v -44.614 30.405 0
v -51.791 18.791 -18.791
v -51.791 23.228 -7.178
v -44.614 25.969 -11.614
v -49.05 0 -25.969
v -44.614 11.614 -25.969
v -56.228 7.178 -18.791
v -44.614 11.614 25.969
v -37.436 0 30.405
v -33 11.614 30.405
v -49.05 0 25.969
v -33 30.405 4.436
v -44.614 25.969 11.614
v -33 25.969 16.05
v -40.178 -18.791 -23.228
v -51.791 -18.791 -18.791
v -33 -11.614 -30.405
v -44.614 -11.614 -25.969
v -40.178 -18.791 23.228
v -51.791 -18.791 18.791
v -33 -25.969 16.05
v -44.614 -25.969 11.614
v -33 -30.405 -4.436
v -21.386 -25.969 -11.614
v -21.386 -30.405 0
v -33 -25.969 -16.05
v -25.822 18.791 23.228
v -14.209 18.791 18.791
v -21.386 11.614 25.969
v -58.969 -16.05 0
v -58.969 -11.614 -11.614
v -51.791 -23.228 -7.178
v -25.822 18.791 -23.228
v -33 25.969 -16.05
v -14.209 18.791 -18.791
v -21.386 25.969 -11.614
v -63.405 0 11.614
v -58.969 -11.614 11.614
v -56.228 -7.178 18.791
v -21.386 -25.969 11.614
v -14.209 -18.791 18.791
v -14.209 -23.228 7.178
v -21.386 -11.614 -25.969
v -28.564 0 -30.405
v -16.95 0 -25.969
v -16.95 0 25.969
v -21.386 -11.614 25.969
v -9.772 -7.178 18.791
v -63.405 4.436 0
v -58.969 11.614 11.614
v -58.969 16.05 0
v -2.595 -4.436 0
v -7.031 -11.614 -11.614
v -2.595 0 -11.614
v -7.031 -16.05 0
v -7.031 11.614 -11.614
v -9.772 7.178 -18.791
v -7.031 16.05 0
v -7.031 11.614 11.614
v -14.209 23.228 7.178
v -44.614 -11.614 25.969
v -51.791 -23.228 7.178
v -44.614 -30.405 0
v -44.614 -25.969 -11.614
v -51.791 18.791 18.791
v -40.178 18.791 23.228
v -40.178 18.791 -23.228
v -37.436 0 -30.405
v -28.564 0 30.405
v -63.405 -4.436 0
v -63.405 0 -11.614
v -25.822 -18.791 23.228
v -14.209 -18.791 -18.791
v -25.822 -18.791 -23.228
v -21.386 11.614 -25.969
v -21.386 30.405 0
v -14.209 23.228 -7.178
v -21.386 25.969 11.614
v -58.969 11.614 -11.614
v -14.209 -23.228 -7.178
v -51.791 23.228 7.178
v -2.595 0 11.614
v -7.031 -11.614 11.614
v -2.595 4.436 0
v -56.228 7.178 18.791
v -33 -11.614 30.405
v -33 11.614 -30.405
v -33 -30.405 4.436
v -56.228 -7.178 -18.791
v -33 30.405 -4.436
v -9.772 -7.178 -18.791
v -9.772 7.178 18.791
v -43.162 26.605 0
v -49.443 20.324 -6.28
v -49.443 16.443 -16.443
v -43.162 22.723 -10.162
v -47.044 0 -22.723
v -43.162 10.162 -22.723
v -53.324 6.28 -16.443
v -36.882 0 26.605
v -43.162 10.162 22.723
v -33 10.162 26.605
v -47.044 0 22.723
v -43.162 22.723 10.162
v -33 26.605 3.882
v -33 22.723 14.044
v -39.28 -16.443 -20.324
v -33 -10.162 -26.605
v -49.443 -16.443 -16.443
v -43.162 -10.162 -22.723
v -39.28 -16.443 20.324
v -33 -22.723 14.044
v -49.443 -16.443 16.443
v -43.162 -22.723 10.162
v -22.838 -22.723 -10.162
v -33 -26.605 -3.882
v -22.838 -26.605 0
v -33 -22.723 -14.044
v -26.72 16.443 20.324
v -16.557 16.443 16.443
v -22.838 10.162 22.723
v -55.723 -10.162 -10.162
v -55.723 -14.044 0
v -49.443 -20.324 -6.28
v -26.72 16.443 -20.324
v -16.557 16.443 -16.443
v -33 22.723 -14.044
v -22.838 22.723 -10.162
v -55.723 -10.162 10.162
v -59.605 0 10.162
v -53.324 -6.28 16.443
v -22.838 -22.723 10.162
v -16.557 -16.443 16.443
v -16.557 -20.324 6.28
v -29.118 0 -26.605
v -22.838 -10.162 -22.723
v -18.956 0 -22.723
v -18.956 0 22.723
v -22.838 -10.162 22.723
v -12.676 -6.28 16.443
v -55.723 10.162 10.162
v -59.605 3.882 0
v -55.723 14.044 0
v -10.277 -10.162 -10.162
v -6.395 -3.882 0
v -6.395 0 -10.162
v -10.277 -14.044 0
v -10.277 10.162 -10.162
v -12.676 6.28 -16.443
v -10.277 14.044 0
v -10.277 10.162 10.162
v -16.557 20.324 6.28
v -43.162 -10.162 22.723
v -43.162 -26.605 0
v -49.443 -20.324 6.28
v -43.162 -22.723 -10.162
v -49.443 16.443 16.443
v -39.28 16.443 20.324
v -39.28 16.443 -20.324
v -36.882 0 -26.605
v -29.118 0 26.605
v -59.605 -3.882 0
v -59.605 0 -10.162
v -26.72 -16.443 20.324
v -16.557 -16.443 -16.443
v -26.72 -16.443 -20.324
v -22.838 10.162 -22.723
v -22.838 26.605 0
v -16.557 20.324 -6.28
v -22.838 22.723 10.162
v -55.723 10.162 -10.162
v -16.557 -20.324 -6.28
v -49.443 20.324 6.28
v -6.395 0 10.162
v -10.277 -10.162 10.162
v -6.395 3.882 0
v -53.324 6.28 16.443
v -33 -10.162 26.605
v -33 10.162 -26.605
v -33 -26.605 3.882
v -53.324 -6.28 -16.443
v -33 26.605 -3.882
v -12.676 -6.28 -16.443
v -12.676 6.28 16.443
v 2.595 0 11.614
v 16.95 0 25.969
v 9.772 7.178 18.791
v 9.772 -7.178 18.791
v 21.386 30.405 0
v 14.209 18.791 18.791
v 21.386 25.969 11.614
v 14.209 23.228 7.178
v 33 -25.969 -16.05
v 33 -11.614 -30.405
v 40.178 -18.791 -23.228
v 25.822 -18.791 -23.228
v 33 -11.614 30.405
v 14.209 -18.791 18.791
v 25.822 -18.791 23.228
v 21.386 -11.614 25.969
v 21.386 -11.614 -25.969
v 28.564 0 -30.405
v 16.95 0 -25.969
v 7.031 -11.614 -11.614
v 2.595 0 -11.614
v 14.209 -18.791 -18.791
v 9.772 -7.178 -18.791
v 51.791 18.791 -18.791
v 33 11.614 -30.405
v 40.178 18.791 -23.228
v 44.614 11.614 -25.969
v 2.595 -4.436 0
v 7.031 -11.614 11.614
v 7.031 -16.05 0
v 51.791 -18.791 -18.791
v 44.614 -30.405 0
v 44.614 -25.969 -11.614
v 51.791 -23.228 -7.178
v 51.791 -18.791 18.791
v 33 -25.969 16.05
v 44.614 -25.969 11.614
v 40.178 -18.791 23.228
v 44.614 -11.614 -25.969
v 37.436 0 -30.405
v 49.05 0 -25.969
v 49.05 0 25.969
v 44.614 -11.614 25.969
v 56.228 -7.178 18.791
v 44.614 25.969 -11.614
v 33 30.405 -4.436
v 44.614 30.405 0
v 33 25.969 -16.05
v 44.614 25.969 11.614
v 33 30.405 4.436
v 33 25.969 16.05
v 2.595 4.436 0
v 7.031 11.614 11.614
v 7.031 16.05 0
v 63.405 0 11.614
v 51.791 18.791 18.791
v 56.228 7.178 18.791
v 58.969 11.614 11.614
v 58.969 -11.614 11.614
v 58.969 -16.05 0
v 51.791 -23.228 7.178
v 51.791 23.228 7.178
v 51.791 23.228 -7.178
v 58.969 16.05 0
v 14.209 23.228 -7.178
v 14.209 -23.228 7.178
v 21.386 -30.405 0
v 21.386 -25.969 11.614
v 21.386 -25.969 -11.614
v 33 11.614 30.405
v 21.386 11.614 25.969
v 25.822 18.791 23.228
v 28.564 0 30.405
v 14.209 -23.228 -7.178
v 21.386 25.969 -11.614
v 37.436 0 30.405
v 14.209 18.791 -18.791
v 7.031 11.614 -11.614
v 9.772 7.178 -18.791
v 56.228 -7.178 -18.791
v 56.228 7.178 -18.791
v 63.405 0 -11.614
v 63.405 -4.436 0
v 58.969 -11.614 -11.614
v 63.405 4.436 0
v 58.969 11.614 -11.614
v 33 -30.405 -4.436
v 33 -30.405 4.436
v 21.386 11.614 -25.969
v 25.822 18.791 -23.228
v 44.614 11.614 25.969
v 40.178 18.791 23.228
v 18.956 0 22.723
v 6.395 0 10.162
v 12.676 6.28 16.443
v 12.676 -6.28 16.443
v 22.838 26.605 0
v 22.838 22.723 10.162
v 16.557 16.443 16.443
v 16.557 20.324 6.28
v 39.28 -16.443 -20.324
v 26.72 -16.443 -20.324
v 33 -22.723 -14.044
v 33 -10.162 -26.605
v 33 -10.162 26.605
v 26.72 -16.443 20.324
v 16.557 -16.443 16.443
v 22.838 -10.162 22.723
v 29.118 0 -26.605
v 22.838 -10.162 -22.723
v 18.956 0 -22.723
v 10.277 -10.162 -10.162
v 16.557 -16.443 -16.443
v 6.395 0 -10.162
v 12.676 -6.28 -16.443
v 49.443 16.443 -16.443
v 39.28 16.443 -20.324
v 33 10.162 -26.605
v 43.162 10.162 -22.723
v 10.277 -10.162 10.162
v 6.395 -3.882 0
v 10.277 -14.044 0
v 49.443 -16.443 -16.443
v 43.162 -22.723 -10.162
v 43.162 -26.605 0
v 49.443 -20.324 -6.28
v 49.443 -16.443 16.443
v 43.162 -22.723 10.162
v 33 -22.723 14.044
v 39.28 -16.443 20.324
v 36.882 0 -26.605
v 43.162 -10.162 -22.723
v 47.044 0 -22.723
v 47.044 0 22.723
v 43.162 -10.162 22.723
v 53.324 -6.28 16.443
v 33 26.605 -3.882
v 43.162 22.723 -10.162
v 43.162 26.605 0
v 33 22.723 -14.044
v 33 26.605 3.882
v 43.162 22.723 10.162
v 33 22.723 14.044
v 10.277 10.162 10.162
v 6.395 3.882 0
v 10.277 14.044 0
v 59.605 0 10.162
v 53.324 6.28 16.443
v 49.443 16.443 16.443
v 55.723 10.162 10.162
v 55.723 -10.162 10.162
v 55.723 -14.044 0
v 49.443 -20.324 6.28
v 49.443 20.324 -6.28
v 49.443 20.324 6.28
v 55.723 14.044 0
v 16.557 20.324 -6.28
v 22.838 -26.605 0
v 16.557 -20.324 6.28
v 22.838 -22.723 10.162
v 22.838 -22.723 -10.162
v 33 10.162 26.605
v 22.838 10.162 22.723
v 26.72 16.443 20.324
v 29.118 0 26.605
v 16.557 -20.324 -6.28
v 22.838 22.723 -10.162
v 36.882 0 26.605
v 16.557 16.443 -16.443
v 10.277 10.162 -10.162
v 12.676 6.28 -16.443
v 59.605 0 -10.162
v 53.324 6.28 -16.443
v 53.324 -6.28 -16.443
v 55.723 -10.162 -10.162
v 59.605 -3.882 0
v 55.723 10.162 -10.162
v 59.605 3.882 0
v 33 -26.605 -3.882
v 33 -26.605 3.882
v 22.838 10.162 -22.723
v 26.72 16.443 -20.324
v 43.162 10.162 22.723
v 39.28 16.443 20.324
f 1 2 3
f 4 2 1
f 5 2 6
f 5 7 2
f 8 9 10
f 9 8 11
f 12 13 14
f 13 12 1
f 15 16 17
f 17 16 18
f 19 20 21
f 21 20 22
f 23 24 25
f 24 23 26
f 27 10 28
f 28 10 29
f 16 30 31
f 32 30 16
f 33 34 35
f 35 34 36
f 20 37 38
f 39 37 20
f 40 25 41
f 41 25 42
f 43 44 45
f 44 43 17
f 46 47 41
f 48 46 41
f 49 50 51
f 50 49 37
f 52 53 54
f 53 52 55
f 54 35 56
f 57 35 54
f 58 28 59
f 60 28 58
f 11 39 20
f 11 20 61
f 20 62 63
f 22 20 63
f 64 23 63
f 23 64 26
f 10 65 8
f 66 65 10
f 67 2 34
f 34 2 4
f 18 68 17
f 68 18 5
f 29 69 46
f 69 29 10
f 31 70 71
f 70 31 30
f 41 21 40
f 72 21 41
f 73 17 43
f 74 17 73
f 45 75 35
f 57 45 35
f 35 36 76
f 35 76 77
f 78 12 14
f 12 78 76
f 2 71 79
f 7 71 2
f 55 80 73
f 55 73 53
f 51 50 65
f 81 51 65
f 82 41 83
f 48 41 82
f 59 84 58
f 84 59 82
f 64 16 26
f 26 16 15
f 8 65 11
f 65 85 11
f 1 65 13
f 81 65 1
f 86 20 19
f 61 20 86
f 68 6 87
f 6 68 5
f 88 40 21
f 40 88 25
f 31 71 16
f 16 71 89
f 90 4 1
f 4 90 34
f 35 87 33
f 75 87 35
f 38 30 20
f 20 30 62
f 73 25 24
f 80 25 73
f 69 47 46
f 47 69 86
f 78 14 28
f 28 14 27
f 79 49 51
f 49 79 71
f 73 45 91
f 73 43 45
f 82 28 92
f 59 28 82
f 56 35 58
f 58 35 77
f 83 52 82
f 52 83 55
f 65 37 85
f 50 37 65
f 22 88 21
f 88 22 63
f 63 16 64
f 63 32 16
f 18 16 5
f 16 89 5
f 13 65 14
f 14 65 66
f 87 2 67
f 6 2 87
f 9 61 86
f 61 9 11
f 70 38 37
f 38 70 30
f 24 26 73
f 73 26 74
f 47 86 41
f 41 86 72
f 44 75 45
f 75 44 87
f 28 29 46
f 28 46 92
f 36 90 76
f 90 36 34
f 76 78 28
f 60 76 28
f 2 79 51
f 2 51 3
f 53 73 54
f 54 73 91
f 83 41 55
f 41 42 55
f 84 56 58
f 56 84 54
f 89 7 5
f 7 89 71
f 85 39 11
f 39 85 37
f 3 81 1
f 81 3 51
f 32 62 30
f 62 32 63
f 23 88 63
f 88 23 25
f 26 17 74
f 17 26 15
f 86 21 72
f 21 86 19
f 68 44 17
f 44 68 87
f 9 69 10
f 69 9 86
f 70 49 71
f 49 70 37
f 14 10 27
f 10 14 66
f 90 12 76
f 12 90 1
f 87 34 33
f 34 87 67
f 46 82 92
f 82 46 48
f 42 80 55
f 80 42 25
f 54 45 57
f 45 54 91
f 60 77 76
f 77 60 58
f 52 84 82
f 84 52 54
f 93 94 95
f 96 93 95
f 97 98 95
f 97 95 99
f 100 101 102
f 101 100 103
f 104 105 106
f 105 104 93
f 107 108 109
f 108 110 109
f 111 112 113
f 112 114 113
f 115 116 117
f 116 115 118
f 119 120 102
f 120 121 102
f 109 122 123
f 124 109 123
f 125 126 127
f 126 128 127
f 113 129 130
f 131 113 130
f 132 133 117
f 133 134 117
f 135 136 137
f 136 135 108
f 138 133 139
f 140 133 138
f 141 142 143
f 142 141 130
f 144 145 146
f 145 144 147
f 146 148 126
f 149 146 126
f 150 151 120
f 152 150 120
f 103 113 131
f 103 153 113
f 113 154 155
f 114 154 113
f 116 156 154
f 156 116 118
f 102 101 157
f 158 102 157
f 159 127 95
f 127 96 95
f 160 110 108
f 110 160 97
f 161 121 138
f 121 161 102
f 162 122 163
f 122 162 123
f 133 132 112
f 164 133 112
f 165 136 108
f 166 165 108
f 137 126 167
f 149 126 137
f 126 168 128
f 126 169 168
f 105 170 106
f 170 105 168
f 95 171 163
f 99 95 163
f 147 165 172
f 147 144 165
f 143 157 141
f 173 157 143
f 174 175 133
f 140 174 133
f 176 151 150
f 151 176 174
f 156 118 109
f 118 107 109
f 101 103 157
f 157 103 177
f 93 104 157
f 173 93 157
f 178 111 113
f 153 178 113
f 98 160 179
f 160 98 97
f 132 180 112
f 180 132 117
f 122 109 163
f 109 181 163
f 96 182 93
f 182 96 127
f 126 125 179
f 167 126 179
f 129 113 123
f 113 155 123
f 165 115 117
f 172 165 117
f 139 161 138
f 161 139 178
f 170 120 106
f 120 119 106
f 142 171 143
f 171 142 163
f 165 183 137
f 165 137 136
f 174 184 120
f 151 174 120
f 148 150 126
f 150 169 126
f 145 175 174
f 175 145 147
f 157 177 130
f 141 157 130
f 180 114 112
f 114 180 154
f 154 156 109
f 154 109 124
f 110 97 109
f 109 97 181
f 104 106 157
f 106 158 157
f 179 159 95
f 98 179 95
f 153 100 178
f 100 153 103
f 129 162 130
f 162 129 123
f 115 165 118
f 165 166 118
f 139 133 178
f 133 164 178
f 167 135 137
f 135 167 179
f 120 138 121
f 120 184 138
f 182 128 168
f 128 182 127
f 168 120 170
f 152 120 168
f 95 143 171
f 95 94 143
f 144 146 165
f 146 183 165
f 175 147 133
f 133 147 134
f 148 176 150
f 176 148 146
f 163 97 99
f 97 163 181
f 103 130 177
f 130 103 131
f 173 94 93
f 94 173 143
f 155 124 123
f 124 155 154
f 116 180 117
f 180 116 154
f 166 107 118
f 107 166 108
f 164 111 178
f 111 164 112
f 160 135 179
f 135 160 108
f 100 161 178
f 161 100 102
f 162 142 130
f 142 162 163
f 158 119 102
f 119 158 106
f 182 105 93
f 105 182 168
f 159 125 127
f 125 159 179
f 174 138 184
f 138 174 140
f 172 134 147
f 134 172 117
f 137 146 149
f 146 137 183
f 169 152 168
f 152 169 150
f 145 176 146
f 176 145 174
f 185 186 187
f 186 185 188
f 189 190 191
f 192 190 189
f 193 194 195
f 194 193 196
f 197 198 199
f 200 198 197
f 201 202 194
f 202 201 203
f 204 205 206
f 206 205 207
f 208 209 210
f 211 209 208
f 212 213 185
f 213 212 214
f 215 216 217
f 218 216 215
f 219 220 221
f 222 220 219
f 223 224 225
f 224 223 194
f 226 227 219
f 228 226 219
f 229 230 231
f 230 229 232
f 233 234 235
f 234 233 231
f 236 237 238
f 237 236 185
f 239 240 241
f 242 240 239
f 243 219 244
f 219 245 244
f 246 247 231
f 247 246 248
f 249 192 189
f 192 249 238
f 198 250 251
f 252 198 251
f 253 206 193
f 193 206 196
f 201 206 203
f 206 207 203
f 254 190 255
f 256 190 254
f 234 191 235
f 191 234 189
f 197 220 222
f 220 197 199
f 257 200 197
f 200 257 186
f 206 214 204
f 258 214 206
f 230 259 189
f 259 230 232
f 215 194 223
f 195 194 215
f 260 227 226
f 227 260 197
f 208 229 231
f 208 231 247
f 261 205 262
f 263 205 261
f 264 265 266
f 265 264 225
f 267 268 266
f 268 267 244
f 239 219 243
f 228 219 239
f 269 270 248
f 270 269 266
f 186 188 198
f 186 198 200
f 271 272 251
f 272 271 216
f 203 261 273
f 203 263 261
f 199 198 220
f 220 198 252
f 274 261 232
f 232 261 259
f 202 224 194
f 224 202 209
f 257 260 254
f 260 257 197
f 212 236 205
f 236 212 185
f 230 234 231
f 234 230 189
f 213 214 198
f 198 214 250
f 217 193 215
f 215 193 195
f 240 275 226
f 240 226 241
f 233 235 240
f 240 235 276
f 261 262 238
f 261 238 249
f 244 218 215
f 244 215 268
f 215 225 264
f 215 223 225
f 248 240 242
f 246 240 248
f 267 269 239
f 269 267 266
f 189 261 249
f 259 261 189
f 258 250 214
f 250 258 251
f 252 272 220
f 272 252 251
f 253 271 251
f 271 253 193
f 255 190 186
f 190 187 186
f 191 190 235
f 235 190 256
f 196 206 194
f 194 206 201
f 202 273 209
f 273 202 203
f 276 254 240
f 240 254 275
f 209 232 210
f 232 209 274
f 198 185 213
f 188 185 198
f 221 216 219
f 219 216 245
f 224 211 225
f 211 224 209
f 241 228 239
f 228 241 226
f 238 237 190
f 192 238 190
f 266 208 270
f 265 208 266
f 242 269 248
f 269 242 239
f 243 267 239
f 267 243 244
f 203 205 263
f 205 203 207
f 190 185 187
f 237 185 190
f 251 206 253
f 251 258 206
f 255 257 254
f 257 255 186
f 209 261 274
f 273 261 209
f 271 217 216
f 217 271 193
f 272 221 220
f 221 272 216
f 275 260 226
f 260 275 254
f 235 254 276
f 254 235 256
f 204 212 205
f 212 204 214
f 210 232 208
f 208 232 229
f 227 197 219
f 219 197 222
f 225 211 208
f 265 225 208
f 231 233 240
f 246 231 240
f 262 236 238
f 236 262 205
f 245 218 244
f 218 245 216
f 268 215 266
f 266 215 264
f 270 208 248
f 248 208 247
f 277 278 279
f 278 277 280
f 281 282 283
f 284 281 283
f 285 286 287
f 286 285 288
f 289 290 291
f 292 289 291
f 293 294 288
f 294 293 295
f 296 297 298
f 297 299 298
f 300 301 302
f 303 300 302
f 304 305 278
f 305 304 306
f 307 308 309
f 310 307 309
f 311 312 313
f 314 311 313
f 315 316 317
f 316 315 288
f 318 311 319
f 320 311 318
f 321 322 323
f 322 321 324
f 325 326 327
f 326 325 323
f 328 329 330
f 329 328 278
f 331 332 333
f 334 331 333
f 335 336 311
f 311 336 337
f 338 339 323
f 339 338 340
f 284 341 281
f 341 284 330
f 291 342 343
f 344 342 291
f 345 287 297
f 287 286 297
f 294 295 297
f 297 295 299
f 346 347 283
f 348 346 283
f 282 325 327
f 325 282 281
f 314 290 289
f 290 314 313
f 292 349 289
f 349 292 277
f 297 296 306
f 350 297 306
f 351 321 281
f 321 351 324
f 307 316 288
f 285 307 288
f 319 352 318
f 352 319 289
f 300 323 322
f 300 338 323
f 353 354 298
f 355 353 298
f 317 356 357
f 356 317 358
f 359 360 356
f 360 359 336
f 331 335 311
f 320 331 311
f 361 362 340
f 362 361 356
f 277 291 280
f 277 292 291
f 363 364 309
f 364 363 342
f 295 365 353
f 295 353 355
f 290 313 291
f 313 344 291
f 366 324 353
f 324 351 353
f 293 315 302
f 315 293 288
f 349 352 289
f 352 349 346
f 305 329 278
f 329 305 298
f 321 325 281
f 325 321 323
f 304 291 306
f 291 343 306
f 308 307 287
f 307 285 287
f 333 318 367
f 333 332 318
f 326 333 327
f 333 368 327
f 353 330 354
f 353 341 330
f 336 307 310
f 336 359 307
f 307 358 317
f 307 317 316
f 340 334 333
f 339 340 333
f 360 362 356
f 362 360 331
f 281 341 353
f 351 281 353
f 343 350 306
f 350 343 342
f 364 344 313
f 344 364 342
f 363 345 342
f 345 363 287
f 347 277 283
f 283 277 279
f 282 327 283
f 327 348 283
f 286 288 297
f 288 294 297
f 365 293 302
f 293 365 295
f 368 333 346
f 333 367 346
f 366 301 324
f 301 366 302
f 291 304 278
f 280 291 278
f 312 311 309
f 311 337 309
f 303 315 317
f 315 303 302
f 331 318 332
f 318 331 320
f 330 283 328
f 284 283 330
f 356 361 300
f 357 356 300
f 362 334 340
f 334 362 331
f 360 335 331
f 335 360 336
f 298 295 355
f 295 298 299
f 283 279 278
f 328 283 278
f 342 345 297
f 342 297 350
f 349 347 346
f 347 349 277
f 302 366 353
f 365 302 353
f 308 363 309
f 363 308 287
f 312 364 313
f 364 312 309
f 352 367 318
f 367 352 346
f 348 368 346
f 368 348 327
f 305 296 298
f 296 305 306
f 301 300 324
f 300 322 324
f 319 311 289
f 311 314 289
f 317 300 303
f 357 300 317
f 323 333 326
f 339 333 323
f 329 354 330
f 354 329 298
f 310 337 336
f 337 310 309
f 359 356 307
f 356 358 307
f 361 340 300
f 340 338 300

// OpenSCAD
F=(1+sqrt(5))/2;
P=[[0,0,0],[-21-34*F,0,-8-13*F],[-21-34*F,0,8+13*F],[-21-34*F,3+5*F,0],[-18-29*F,-11-18*F,0],[-18-29*F,-8-13*F,-8-13*F],[-18-29*F,-8-13*F,8+13*F],[-18-29*F,8+13*F,-8-13*F],[-18-29*F,8+13*F,8+13*F],[-18-29*F,11+18*F,0],[-16-26*F,-5-8*F,-13-21*F],[-16-26*F,-5-8*F,13+21*F],[-16-26*F,5+8*F,-13-21*F],[-16-26*F,5+8*F,13+21*F],[-13-21*F,-16-26*F,-5-8*F],[-13-21*F,-16-26*F,5+8*F],[-13-21*F,-13-21*F,-13-21*F],[-13-21*F,-13-21*F,13+21*F],[-13-21*F,13+21*F,-13-21*F],[-13-21*F,13+21*F,13+21*F],[-13-21*F,16+26*F,-5-8*F],[-13-21*F,16+26*F,5+8*F],[-11-18*F,0,-18-29*F],[-11-18*F,0,18+29*F],[-8-13*F,-21-34*F,0],[-8-13*F,-18-29*F,-8-13*F],[-8-13*F,-18-29*F,8+13*F],[-8-13*F,-8-13*F,-18-29*F],[-8-13*F,-8-13*F,18+29*F],[-8-13*F,8+13*F,-18-29*F],[-8-13*F,8+13*F,18+29*F],[-8-13*F,18+29*F,-8-13*F],[-8-13*F,18+29*F,8+13*F],[-8-13*F,21+34*F,0],[-5-8*F,-13-21*F,-16-26*F],[-5-8*F,-13-21*F,16+26*F],[-5-8*F,13+21*F,-16-26*F],[-5-8*F,13+21*F,16+26*F],[-3-5*F,0,-21-34*F],[-3-5*F,0,21+34*F],[0,-21-34*F,-3-5*F],[0,-21-34*F,3+5*F],[0,-18-29*F,-11-18*F],[0,-18-29*F,11+18*F],[0,-8-13*F,-21-34*F],[0,-8-13*F,21+34*F],[-21-34*F,-3-5*F,0],[0,8+13*F,-21-34*F],[0,8+13*F,21+34*F],[0,18+29*F,-11-18*F],[0,18+29*F,11+18*F],[0,21+34*F,-3-5*F],[0,21+34*F,3+5*F],[3+5*F,0,-21-34*F],[3+5*F,0,21+34*F],[5+8*F,-13-21*F,-16-26*F],[5+8*F,-13-21*F,16+26*F],[5+8*F,13+21*F,-16-26*F],[5+8*F,13+21*F,16+26*F],[8+13*F,-21-34*F,0],[8+13*F,-18-29*F,-8-13*F],[8+13*F,-18-29*F,8+13*F],[8+13*F,-8-13*F,-18-29*F],[8+13*F,-8-13*F,18+29*F],[8+13*F,8+13*F,-18-29*F],[8+13*F,8+13*F,18+29*F],[8+13*F,18+29*F,-8-13*F],[8+13*F,18+29*F,8+13*F],[8+13*F,21+34*F,0],[11+18*F,0,-18-29*F],[11+18*F,0,18+29*F],[13+21*F,-16-26*F,-5-8*F],[13+21*F,-16-26*F,5+8*F],[13+21*F,-13-21*F,-13-21*F],[13+21*F,-13-21*F,13+21*F],[13+21*F,13+21*F,-13-21*F],[13+21*F,13+21*F,13+21*F],[13+21*F,16+26*F,-5-8*F],[13+21*F,16+26*F,5+8*F],[16+26*F,-5-8*F,-13-21*F],[16+26*F,-5-8*F,13+21*F],[16+26*F,5+8*F,-13-21*F],[16+26*F,5+8*F,13+21*F],[18+29*F,-11-18*F,0],[18+29*F,-8-13*F,-8-13*F],[18+29*F,-8-13*F,8+13*F],[18+29*F,8+13*F,-8-13*F],[18+29*F,8+13*F,8+13*F],[18+29*F,11+18*F,0],[21+34*F,-3-5*F,0],[21+34*F,0,-8-13*F],[21+34*F,0,8+13*F],[21+34*F,3+5*F,0]];
X=[
[[20,33,0],[33,31,0],[31,18,0],[18,20,0],[18,31,33,20]],
[[29,22,0],[22,12,0],[12,18,0],[18,29,0],[18,12,22,29]],
[[30,23,0],[23,39,0],[39,48,0],[48,30,0],[48,39,23,30]],
[[32,50,0],[50,52,0],[52,33,0],[33,32,0],[33,52,50,32]],
[[34,16,0],[16,27,0],[27,44,0],[44,34,0],[44,27,16,34]],
[[35,17,0],[17,26,0],[26,43,0],[43,35,0],[43,26,17,35]],
[[40,42,0],[42,60,0],[60,59,0],[59,40,0],[59,60,42,40]],
[[48,65,0],[65,76,0],[76,58,0],[58,48,0],[58,76,65,48]],
[[5,16,0],[16,14,0],[14,4,0],[4,5,0],[4,14,16,5]],
[[57,49,0],[49,66,0],[66,75,0],[75,57,0],[75,66,49,57]],
[[6,17,0],[17,11,0],[11,2,0],[2,6,0],[2,11,17,6]],
[[61,59,0],[59,72,0],[72,74,0],[74,61,0],[74,72,59,61]],
[[62,44,0],[44,53,0],[53,69,0],[69,62,0],[69,53,44,62]],
[[63,74,0],[74,80,0],[80,70,0],[70,63,0],[70,80,74,63]],
[[8,9,0],[9,3,0],[3,2,0],[2,8,0],[2,3,9,8]],
[[84,90,0],[90,89,0],[89,83,0],[83,84,0],[83,89,90,84]],
[[86,90,0],[90,81,0],[81,75,0],[75,86,0],[75,81,90,86]],
[[87,88,0],[88,78,0],[78,76,0],[76,87,0],[76,78,88,87]],
[[17,28,0],[28,23,0],[23,11,0],[11,17,0],[11,23,28,17]],
[[24,26,0],[26,17,0],[17,15,0],[15,24,0],[15,17,26,24]],
[[25,42,0],[42,40,0],[40,24,0],[24,25,0],[24,40,42,25]],
[[30,48,0],[48,37,0],[37,19,0],[19,30,0],[19,37,48,30]],
[[36,18,0],[18,31,0],[31,49,0],[49,36,0],[49,31,18,36]],
[[38,44,0],[44,27,0],[27,22,0],[22,38,0],[22,27,44,38]],
[[48,54,0],[54,70,0],[70,65,0],[65,48,0],[65,70,54,48]],
[[5,4,0],[4,46,0],[46,1,0],[1,5,0],[1,46,4,5]],
[[61,74,0],[74,56,0],[56,43,0],[43,61,0],[43,56,74,61]],
[[62,73,0],[73,55,0],[55,44,0],[44,62,0],[44,55,73,62]],
[[64,75,0],[75,81,0],[81,69,0],[69,64,0],[69,81,75,64]],
[[66,68,0],[68,77,0],[77,75,0],[75,66,0],[75,77,68,66]],
[[67,68,0],[68,52,0],[52,50,0],[50,67,0],[50,52,68,67]],
[[7,18,0],[18,12,0],[12,1,0],[1,7,0],[1,12,18,7]],
[[71,73,0],[73,84,0],[84,83,0],[83,71,0],[83,84,73,71]],
[[8,19,0],[19,21,0],[21,9,0],[9,8,0],[9,21,19,8]],
[[85,91,0],[91,80,0],[80,74,0],[74,85,0],[74,80,91,85]],
[[87,91,0],[91,92,0],[92,88,0],[88,87,0],[88,92,91,87]],
[[25,16,0],[16,34,0],[34,42,0],[42,25,0],[42,34,16,25]],
[[30,19,0],[19,13,0],[13,23,0],[23,30,0],[23,13,19,30]],
[[32,33,0],[33,21,0],[21,19,0],[19,32,0],[19,21,33,32]],
[[35,45,0],[45,28,0],[28,17,0],[17,35,0],[17,28,45,35]],
[[38,22,0],[22,29,0],[29,47,0],[47,38,0],[47,29,22,38]],
[[41,59,0],[59,61,0],[61,43,0],[43,41,0],[43,61,59,41]],
[[5,1,0],[1,10,0],[10,16,0],[16,5,0],[16,10,1,5]],
[[51,49,0],[49,31,0],[31,33,0],[33,51,0],[33,31,49,51]],
[[57,75,0],[75,64,0],[64,47,0],[47,57,0],[47,64,75,57]],
[[6,4,0],[4,15,0],[15,17,0],[17,6,0],[17,15,4,6]],
[[60,73,0],[73,71,0],[71,59,0],[59,60,0],[59,71,73,60]],
[[63,70,0],[70,54,0],[54,45,0],[45,63,0],[45,54,70,63]],
[[67,50,0],[50,58,0],[58,76,0],[76,67,0],[76,58,50,67]],
[[7,1,0],[1,3,0],[3,9,0],[9,7,0],[9,3,1,7]],
[[79,73,0],[73,62,0],[62,69,0],[69,79,0],[69,62,73,79]],
[[82,91,0],[91,87,0],[87,76,0],[76,82,0],[76,87,91,82]],
[[86,75,0],[75,77,0],[77,88,0],[88,86,0],[88,77,75,86]],
[[89,91,0],[91,85,0],[85,83,0],[83,89,0],[83,85,91,89]],
[[13,19,0],[19,8,0],[8,2,0],[2,13,0],[2,8,19,13]],
[[24,41,0],[41,43,0],[43,26,0],[26,24,0],[26,43,41,24]],
[[25,24,0],[24,14,0],[14,16,0],[16,25,0],[16,14,24,25]],
[[27,16,0],[16,10,0],[10,22,0],[22,27,0],[22,10,16,27]],
[[32,19,0],[19,37,0],[37,50,0],[50,32,0],[50,37,19,32]],
[[36,47,0],[47,29,0],[29,18,0],[18,36,0],[18,29,47,36]],
[[39,23,0],[23,28,0],[28,45,0],[45,39,0],[45,28,23,39]],
[[6,2,0],[2,46,0],[46,4,0],[4,6,0],[4,46,2,6]],
[[60,42,0],[42,55,0],[55,73,0],[73,60,0],[73,55,42,60]],
[[63,45,0],[45,56,0],[56,74,0],[74,63,0],[74,56,45,63]],
[[64,69,0],[69,53,0],[53,47,0],[47,64,0],[47,53,69,64]],
[[65,70,0],[70,82,0],[82,76,0],[76,65,0],[76,82,70,65]],
[[66,49,0],[49,51,0],[51,68,0],[68,66,0],[68,51,49,66]],
[[67,76,0],[76,78,0],[78,68,0],[68,67,0],[68,78,76,67]],
[[7,9,0],[9,20,0],[20,18,0],[18,7,0],[18,20,9,7]],
[[84,73,0],[73,79,0],[79,90,0],[90,84,0],[90,79,73,84]],
[[85,74,0],[74,72,0],[72,83,0],[83,85,0],[83,72,74,85]],
[[86,88,0],[88,92,0],[92,90,0],[90,86,0],[90,92,88,86]],
[[12,22,0],[22,10,0],[10,1,0],[1,12,0],[1,10,22,12]],
[[13,2,0],[2,11,0],[11,23,0],[23,13,0],[23,11,2,13]],
[[21,33,0],[33,20,0],[20,9,0],[9,21,0],[9,20,33,21]],
[[24,15,0],[15,4,0],[4,14,0],[14,24,0],[14,4,15,24]],
[[24,40,0],[40,59,0],[59,41,0],[41,24,0],[41,59,40,24]],
[[34,44,0],[44,55,0],[55,42,0],[42,34,0],[42,55,44,34]],
[[35,43,0],[43,56,0],[56,45,0],[45,35,0],[45,56,43,35]],
[[38,47,0],[47,53,0],[53,44,0],[44,38,0],[44,53,47,38]],
[[39,45,0],[45,54,0],[54,48,0],[48,39,0],[48,54,45,39]],
[[46,2,0],[2,3,0],[3,1,0],[1,46,0],[1,3,2,46]],
[[48,58,0],[58,50,0],[50,37,0],[37,48,0],[37,50,58,48]],
[[51,33,0],[33,52,0],[52,68,0],[68,51,0],[68,52,33,51]],
[[57,47,0],[47,36,0],[36,49,0],[49,57,0],[49,36,47,57]],
[[70,80,0],[80,91,0],[91,82,0],[82,70,0],[82,91,80,70]],
[[71,83,0],[83,72,0],[72,59,0],[59,71,0],[59,72,83,71]],
[[79,69,0],[69,81,0],[81,90,0],[90,79,0],[90,81,69,79]],
[[88,77,0],[77,68,0],[68,78,0],[78,88,0],[78,68,77,88]],
[[92,91,0],[91,89,0],[89,90,0],[90,92,0],[90,89,91,92]],
[[13,2,0],[2,11,0],[11,23,0],[23,13,0],[23,11,2,13]],
[[32,33,0],[33,21,0],[21,19,0],[19,32,0],[19,21,33,32]],
[[34,44,0],[44,55,0],[55,42,0],[42,34,0],[42,55,44,34]],
[[35,45,0],[45,28,0],[28,17,0],[17,35,0],[17,28,45,35]],
[[38,44,0],[44,27,0],[27,22,0],[22,38,0],[22,27,44,38]],
[[5,1,0],[1,10,0],[10,16,0],[16,5,0],[16,10,1,5]],
[[57,75,0],[75,64,0],[64,47,0],[47,57,0],[47,64,75,57]],
[[6,2,0],[2,46,0],[46,4,0],[4,6,0],[4,46,2,6]],
[[60,73,0],[73,71,0],[71,59,0],[59,60,0],[59,71,73,60]],
[[61,74,0],[74,56,0],[56,43,0],[43,61,0],[43,56,74,61]],
[[62,44,0],[44,53,0],[53,69,0],[69,62,0],[69,53,44,62]],
[[63,74,0],[74,80,0],[80,70,0],[70,63,0],[70,80,74,63]],
[[66,49,0],[49,51,0],[51,68,0],[68,66,0],[68,51,49,66]],
[[67,68,0],[68,52,0],[52,50,0],[50,67,0],[50,52,68,67]],
[[8,9,0],[9,3,0],[3,2,0],[2,8,0],[2,3,9,8]],
[[82,91,0],[91,87,0],[87,76,0],[76,82,0],[76,87,91,82]],
[[85,74,0],[74,72,0],[72,83,0],[83,85,0],[83,72,74,85]],
[[88,77,0],[77,68,0],[68,78,0],[78,88,0],[78,68,77,88]],
[[21,33,0],[33,20,0],[20,9,0],[9,21,0],[9,20,33,21]],
[[24,26,0],[26,17,0],[17,15,0],[15,24,0],[15,17,26,24]],
[[25,16,0],[16,34,0],[34,42,0],[42,25,0],[42,34,16,25]],
[[27,16,0],[16,10,0],[10,22,0],[22,27,0],[22,10,16,27]],
[[30,48,0],[48,37,0],[37,19,0],[19,30,0],[19,37,48,30]],
[[32,50,0],[50,52,0],[52,33,0],[33,32,0],[33,52,50,32]],
[[35,43,0],[43,56,0],[56,45,0],[45,35,0],[45,56,43,35]],
[[39,23,0],[23,28,0],[28,45,0],[45,39,0],[45,28,23,39]],
[[5,16,0],[16,14,0],[14,4,0],[4,5,0],[4,14,16,5]],
[[51,49,0],[49,31,0],[31,33,0],[33,51,0],[33,31,49,51]],
[[62,73,0],[73,55,0],[55,44,0],[44,62,0],[44,55,73,62]],
[[63,70,0],[70,54,0],[54,45,0],[45,63,0],[45,54,70,63]],
[[66,68,0],[68,77,0],[77,75,0],[75,66,0],[75,77,68,66]],
[[7,18,0],[18,12,0],[12,1,0],[1,7,0],[1,12,18,7]],
[[79,69,0],[69,81,0],[81,90,0],[90,79,0],[90,81,69,79]],
[[84,90,0],[90,89,0],[89,83,0],[83,84,0],[83,89,90,84]],
[[85,91,0],[91,80,0],[80,74,0],[74,85,0],[74,80,91,85]],
[[86,88,0],[88,92,0],[92,90,0],[90,86,0],[90,92,88,86]],
[[17,28,0],[28,23,0],[23,11,0],[11,17,0],[11,23,28,17]],
[[24,40,0],[40,59,0],[59,41,0],[41,24,0],[41,59,40,24]],
[[29,22,0],[22,12,0],[12,18,0],[18,29,0],[18,12,22,29]],
[[35,17,0],[17,26,0],[26,43,0],[43,35,0],[43,26,17,35]],
[[36,18,0],[18,31,0],[31,49,0],[49,36,0],[49,31,18,36]],
[[38,47,0],[47,53,0],[53,44,0],[44,38,0],[44,53,47,38]],
[[39,45,0],[45,54,0],[54,48,0],[48,39,0],[48,54,45,39]],
[[46,2,0],[2,3,0],[3,1,0],[1,46,0],[1,3,2,46]],
[[51,33,0],[33,52,0],[52,68,0],[68,51,0],[68,52,33,51]],
[[6,4,0],[4,15,0],[15,17,0],[17,6,0],[17,15,4,6]],
[[60,42,0],[42,55,0],[55,73,0],[73,60,0],[73,55,42,60]],
[[65,70,0],[70,82,0],[82,76,0],[76,65,0],[76,82,70,65]],
[[67,50,0],[50,58,0],[58,76,0],[76,67,0],[76,58,50,67]],
[[7,9,0],[9,20,0],[20,18,0],[18,7,0],[18,20,9,7]],
[[71,73,0],[73,84,0],[84,83,0],[83,71,0],[83,84,73,71]],
[[79,73,0],[73,62,0],[62,69,0],[69,79,0],[69,62,73,79]],
[[87,88,0],[88,78,0],[78,76,0],[76,87,0],[76,78,88,87]],
[[92,91,0],[91,89,0],[89,90,0],[90,92,0],[90,89,91,92]],
[[20,33,0],[33,31,0],[31,18,0],[18,20,0],[18,31,33,20]],
[[24,15,0],[15,4,0],[4,14,0],[14,24,0],[14,4,15,24]],
[[24,41,0],[41,43,0],[43,26,0],[26,24,0],[26,43,41,24]],
[[25,42,0],[42,40,0],[40,24,0],[24,25,0],[24,40,42,25]],
[[30,19,0],[19,13,0],[13,23,0],[23,30,0],[23,13,19,30]],
[[32,19,0],[19,37,0],[37,50,0],[50,32,0],[50,37,19,32]],
[[34,16,0],[16,27,0],[27,44,0],[44,34,0],[44,27,16,34]],
[[38,22,0],[22,29,0],[29,47,0],[47,38,0],[47,29,22,38]],
[[48,65,0],[65,76,0],[76,58,0],[58,48,0],[58,76,65,48]],
[[57,47,0],[47,36,0],[36,49,0],[49,57,0],[49,36,47,57]],
[[6,17,0],[17,11,0],[11,2,0],[2,6,0],[2,11,17,6]],
[[61,59,0],[59,72,0],[72,74,0],[74,61,0],[74,72,59,61]],
[[64,69,0],[69,53,0],[53,47,0],[47,64,0],[47,53,69,64]],
[[70,80,0],[80,91,0],[91,82,0],[82,70,0],[82,91,80,70]],
[[8,19,0],[19,21,0],[21,9,0],[9,8,0],[9,21,19,8]],
[[86,90,0],[90,81,0],[81,75,0],[75,86,0],[75,81,90,86]],
[[87,91,0],[91,92,0],[92,88,0],[88,87,0],[88,92,91,87]],
[[89,91,0],[91,85,0],[85,83,0],[83,89,0],[83,85,91,89]],
[[12,22,0],[22,10,0],[10,1,0],[1,12,0],[1,10,22,12]],
[[13,19,0],[19,8,0],[8,2,0],[2,13,0],[2,8,19,13]],
[[25,24,0],[24,14,0],[14,16,0],[16,25,0],[16,14,24,25]],
[[30,23,0],[23,39,0],[39,48,0],[48,30,0],[48,39,23,30]],
[[36,47,0],[47,29,0],[29,18,0],[18,36,0],[18,29,47,36]],
[[40,42,0],[42,60,0],[60,59,0],[59,40,0],[59,60,42,40]],
[[41,59,0],[59,61,0],[61,43,0],[43,41,0],[43,61,59,41]],
[[48,54,0],[54,70,0],[70,65,0],[65,48,0],[65,70,54,48]],
[[48,58,0],[58,50,0],[50,37,0],[37,48,0],[37,50,58,48]],
[[5,4,0],[4,46,0],[46,1,0],[1,5,0],[1,46,4,5]],
[[57,49,0],[49,66,0],[66,75,0],[75,57,0],[75,66,49,57]],
[[63,45,0],[45,56,0],[56,74,0],[74,63,0],[74,56,45,63]],
[[64,75,0],[75,81,0],[81,69,0],[69,64,0],[69,81,75,64]],
[[67,76,0],[76,78,0],[78,68,0],[68,67,0],[68,78,76,67]],
[[7,1,0],[1,3,0],[3,9,0],[9,7,0],[9,3,1,7]],
[[71,83,0],[83,72,0],[72,59,0],[59,71,0],[59,72,83,71]],
[[84,73,0],[73,79,0],[79,90,0],[90,84,0],[90,79,73,84]],
[[86,75,0],[75,77,0],[77,88,0],[88,86,0],[88,77,75,86]]
];

module reflexible() {
    color("blue")   for (i =[ 0:17]) polyhedron(P,faces=X[i]);
    color("green")  for (i =[18:35]) polyhedron(P,faces=X[i]);
    color("red")    for (i =[36:53]) polyhedron(P,faces=X[i]);
    color("yellow") for (i =[54:71]) polyhedron(P,faces=X[i]);
    color("white")  for (i =[72:89]) polyhedron(P,faces=X[i]);
}
 
module chiral() {
    color("blue")   for (i =[ 90:107]) polyhedron(P,faces=X[i]);
    color("green")  for (i =[108:125]) polyhedron(P,faces=X[i]);
    color("red")    for (i =[126:143]) polyhedron(P,faces=X[i]);
    color("yellow") for (i =[144:161]) polyhedron(P,faces=X[i]);
    color("white")  for (i =[162:179]) polyhedron(P,faces=X[i]);
}

translate([-33,0,0]) difference() {
    scale(0.40) reflexible();
    scale(0.35) reflexible();
}

translate([33,0,0]) difference() {
    scale(0.40) chiral();
    scale(0.35) chiral();
}
